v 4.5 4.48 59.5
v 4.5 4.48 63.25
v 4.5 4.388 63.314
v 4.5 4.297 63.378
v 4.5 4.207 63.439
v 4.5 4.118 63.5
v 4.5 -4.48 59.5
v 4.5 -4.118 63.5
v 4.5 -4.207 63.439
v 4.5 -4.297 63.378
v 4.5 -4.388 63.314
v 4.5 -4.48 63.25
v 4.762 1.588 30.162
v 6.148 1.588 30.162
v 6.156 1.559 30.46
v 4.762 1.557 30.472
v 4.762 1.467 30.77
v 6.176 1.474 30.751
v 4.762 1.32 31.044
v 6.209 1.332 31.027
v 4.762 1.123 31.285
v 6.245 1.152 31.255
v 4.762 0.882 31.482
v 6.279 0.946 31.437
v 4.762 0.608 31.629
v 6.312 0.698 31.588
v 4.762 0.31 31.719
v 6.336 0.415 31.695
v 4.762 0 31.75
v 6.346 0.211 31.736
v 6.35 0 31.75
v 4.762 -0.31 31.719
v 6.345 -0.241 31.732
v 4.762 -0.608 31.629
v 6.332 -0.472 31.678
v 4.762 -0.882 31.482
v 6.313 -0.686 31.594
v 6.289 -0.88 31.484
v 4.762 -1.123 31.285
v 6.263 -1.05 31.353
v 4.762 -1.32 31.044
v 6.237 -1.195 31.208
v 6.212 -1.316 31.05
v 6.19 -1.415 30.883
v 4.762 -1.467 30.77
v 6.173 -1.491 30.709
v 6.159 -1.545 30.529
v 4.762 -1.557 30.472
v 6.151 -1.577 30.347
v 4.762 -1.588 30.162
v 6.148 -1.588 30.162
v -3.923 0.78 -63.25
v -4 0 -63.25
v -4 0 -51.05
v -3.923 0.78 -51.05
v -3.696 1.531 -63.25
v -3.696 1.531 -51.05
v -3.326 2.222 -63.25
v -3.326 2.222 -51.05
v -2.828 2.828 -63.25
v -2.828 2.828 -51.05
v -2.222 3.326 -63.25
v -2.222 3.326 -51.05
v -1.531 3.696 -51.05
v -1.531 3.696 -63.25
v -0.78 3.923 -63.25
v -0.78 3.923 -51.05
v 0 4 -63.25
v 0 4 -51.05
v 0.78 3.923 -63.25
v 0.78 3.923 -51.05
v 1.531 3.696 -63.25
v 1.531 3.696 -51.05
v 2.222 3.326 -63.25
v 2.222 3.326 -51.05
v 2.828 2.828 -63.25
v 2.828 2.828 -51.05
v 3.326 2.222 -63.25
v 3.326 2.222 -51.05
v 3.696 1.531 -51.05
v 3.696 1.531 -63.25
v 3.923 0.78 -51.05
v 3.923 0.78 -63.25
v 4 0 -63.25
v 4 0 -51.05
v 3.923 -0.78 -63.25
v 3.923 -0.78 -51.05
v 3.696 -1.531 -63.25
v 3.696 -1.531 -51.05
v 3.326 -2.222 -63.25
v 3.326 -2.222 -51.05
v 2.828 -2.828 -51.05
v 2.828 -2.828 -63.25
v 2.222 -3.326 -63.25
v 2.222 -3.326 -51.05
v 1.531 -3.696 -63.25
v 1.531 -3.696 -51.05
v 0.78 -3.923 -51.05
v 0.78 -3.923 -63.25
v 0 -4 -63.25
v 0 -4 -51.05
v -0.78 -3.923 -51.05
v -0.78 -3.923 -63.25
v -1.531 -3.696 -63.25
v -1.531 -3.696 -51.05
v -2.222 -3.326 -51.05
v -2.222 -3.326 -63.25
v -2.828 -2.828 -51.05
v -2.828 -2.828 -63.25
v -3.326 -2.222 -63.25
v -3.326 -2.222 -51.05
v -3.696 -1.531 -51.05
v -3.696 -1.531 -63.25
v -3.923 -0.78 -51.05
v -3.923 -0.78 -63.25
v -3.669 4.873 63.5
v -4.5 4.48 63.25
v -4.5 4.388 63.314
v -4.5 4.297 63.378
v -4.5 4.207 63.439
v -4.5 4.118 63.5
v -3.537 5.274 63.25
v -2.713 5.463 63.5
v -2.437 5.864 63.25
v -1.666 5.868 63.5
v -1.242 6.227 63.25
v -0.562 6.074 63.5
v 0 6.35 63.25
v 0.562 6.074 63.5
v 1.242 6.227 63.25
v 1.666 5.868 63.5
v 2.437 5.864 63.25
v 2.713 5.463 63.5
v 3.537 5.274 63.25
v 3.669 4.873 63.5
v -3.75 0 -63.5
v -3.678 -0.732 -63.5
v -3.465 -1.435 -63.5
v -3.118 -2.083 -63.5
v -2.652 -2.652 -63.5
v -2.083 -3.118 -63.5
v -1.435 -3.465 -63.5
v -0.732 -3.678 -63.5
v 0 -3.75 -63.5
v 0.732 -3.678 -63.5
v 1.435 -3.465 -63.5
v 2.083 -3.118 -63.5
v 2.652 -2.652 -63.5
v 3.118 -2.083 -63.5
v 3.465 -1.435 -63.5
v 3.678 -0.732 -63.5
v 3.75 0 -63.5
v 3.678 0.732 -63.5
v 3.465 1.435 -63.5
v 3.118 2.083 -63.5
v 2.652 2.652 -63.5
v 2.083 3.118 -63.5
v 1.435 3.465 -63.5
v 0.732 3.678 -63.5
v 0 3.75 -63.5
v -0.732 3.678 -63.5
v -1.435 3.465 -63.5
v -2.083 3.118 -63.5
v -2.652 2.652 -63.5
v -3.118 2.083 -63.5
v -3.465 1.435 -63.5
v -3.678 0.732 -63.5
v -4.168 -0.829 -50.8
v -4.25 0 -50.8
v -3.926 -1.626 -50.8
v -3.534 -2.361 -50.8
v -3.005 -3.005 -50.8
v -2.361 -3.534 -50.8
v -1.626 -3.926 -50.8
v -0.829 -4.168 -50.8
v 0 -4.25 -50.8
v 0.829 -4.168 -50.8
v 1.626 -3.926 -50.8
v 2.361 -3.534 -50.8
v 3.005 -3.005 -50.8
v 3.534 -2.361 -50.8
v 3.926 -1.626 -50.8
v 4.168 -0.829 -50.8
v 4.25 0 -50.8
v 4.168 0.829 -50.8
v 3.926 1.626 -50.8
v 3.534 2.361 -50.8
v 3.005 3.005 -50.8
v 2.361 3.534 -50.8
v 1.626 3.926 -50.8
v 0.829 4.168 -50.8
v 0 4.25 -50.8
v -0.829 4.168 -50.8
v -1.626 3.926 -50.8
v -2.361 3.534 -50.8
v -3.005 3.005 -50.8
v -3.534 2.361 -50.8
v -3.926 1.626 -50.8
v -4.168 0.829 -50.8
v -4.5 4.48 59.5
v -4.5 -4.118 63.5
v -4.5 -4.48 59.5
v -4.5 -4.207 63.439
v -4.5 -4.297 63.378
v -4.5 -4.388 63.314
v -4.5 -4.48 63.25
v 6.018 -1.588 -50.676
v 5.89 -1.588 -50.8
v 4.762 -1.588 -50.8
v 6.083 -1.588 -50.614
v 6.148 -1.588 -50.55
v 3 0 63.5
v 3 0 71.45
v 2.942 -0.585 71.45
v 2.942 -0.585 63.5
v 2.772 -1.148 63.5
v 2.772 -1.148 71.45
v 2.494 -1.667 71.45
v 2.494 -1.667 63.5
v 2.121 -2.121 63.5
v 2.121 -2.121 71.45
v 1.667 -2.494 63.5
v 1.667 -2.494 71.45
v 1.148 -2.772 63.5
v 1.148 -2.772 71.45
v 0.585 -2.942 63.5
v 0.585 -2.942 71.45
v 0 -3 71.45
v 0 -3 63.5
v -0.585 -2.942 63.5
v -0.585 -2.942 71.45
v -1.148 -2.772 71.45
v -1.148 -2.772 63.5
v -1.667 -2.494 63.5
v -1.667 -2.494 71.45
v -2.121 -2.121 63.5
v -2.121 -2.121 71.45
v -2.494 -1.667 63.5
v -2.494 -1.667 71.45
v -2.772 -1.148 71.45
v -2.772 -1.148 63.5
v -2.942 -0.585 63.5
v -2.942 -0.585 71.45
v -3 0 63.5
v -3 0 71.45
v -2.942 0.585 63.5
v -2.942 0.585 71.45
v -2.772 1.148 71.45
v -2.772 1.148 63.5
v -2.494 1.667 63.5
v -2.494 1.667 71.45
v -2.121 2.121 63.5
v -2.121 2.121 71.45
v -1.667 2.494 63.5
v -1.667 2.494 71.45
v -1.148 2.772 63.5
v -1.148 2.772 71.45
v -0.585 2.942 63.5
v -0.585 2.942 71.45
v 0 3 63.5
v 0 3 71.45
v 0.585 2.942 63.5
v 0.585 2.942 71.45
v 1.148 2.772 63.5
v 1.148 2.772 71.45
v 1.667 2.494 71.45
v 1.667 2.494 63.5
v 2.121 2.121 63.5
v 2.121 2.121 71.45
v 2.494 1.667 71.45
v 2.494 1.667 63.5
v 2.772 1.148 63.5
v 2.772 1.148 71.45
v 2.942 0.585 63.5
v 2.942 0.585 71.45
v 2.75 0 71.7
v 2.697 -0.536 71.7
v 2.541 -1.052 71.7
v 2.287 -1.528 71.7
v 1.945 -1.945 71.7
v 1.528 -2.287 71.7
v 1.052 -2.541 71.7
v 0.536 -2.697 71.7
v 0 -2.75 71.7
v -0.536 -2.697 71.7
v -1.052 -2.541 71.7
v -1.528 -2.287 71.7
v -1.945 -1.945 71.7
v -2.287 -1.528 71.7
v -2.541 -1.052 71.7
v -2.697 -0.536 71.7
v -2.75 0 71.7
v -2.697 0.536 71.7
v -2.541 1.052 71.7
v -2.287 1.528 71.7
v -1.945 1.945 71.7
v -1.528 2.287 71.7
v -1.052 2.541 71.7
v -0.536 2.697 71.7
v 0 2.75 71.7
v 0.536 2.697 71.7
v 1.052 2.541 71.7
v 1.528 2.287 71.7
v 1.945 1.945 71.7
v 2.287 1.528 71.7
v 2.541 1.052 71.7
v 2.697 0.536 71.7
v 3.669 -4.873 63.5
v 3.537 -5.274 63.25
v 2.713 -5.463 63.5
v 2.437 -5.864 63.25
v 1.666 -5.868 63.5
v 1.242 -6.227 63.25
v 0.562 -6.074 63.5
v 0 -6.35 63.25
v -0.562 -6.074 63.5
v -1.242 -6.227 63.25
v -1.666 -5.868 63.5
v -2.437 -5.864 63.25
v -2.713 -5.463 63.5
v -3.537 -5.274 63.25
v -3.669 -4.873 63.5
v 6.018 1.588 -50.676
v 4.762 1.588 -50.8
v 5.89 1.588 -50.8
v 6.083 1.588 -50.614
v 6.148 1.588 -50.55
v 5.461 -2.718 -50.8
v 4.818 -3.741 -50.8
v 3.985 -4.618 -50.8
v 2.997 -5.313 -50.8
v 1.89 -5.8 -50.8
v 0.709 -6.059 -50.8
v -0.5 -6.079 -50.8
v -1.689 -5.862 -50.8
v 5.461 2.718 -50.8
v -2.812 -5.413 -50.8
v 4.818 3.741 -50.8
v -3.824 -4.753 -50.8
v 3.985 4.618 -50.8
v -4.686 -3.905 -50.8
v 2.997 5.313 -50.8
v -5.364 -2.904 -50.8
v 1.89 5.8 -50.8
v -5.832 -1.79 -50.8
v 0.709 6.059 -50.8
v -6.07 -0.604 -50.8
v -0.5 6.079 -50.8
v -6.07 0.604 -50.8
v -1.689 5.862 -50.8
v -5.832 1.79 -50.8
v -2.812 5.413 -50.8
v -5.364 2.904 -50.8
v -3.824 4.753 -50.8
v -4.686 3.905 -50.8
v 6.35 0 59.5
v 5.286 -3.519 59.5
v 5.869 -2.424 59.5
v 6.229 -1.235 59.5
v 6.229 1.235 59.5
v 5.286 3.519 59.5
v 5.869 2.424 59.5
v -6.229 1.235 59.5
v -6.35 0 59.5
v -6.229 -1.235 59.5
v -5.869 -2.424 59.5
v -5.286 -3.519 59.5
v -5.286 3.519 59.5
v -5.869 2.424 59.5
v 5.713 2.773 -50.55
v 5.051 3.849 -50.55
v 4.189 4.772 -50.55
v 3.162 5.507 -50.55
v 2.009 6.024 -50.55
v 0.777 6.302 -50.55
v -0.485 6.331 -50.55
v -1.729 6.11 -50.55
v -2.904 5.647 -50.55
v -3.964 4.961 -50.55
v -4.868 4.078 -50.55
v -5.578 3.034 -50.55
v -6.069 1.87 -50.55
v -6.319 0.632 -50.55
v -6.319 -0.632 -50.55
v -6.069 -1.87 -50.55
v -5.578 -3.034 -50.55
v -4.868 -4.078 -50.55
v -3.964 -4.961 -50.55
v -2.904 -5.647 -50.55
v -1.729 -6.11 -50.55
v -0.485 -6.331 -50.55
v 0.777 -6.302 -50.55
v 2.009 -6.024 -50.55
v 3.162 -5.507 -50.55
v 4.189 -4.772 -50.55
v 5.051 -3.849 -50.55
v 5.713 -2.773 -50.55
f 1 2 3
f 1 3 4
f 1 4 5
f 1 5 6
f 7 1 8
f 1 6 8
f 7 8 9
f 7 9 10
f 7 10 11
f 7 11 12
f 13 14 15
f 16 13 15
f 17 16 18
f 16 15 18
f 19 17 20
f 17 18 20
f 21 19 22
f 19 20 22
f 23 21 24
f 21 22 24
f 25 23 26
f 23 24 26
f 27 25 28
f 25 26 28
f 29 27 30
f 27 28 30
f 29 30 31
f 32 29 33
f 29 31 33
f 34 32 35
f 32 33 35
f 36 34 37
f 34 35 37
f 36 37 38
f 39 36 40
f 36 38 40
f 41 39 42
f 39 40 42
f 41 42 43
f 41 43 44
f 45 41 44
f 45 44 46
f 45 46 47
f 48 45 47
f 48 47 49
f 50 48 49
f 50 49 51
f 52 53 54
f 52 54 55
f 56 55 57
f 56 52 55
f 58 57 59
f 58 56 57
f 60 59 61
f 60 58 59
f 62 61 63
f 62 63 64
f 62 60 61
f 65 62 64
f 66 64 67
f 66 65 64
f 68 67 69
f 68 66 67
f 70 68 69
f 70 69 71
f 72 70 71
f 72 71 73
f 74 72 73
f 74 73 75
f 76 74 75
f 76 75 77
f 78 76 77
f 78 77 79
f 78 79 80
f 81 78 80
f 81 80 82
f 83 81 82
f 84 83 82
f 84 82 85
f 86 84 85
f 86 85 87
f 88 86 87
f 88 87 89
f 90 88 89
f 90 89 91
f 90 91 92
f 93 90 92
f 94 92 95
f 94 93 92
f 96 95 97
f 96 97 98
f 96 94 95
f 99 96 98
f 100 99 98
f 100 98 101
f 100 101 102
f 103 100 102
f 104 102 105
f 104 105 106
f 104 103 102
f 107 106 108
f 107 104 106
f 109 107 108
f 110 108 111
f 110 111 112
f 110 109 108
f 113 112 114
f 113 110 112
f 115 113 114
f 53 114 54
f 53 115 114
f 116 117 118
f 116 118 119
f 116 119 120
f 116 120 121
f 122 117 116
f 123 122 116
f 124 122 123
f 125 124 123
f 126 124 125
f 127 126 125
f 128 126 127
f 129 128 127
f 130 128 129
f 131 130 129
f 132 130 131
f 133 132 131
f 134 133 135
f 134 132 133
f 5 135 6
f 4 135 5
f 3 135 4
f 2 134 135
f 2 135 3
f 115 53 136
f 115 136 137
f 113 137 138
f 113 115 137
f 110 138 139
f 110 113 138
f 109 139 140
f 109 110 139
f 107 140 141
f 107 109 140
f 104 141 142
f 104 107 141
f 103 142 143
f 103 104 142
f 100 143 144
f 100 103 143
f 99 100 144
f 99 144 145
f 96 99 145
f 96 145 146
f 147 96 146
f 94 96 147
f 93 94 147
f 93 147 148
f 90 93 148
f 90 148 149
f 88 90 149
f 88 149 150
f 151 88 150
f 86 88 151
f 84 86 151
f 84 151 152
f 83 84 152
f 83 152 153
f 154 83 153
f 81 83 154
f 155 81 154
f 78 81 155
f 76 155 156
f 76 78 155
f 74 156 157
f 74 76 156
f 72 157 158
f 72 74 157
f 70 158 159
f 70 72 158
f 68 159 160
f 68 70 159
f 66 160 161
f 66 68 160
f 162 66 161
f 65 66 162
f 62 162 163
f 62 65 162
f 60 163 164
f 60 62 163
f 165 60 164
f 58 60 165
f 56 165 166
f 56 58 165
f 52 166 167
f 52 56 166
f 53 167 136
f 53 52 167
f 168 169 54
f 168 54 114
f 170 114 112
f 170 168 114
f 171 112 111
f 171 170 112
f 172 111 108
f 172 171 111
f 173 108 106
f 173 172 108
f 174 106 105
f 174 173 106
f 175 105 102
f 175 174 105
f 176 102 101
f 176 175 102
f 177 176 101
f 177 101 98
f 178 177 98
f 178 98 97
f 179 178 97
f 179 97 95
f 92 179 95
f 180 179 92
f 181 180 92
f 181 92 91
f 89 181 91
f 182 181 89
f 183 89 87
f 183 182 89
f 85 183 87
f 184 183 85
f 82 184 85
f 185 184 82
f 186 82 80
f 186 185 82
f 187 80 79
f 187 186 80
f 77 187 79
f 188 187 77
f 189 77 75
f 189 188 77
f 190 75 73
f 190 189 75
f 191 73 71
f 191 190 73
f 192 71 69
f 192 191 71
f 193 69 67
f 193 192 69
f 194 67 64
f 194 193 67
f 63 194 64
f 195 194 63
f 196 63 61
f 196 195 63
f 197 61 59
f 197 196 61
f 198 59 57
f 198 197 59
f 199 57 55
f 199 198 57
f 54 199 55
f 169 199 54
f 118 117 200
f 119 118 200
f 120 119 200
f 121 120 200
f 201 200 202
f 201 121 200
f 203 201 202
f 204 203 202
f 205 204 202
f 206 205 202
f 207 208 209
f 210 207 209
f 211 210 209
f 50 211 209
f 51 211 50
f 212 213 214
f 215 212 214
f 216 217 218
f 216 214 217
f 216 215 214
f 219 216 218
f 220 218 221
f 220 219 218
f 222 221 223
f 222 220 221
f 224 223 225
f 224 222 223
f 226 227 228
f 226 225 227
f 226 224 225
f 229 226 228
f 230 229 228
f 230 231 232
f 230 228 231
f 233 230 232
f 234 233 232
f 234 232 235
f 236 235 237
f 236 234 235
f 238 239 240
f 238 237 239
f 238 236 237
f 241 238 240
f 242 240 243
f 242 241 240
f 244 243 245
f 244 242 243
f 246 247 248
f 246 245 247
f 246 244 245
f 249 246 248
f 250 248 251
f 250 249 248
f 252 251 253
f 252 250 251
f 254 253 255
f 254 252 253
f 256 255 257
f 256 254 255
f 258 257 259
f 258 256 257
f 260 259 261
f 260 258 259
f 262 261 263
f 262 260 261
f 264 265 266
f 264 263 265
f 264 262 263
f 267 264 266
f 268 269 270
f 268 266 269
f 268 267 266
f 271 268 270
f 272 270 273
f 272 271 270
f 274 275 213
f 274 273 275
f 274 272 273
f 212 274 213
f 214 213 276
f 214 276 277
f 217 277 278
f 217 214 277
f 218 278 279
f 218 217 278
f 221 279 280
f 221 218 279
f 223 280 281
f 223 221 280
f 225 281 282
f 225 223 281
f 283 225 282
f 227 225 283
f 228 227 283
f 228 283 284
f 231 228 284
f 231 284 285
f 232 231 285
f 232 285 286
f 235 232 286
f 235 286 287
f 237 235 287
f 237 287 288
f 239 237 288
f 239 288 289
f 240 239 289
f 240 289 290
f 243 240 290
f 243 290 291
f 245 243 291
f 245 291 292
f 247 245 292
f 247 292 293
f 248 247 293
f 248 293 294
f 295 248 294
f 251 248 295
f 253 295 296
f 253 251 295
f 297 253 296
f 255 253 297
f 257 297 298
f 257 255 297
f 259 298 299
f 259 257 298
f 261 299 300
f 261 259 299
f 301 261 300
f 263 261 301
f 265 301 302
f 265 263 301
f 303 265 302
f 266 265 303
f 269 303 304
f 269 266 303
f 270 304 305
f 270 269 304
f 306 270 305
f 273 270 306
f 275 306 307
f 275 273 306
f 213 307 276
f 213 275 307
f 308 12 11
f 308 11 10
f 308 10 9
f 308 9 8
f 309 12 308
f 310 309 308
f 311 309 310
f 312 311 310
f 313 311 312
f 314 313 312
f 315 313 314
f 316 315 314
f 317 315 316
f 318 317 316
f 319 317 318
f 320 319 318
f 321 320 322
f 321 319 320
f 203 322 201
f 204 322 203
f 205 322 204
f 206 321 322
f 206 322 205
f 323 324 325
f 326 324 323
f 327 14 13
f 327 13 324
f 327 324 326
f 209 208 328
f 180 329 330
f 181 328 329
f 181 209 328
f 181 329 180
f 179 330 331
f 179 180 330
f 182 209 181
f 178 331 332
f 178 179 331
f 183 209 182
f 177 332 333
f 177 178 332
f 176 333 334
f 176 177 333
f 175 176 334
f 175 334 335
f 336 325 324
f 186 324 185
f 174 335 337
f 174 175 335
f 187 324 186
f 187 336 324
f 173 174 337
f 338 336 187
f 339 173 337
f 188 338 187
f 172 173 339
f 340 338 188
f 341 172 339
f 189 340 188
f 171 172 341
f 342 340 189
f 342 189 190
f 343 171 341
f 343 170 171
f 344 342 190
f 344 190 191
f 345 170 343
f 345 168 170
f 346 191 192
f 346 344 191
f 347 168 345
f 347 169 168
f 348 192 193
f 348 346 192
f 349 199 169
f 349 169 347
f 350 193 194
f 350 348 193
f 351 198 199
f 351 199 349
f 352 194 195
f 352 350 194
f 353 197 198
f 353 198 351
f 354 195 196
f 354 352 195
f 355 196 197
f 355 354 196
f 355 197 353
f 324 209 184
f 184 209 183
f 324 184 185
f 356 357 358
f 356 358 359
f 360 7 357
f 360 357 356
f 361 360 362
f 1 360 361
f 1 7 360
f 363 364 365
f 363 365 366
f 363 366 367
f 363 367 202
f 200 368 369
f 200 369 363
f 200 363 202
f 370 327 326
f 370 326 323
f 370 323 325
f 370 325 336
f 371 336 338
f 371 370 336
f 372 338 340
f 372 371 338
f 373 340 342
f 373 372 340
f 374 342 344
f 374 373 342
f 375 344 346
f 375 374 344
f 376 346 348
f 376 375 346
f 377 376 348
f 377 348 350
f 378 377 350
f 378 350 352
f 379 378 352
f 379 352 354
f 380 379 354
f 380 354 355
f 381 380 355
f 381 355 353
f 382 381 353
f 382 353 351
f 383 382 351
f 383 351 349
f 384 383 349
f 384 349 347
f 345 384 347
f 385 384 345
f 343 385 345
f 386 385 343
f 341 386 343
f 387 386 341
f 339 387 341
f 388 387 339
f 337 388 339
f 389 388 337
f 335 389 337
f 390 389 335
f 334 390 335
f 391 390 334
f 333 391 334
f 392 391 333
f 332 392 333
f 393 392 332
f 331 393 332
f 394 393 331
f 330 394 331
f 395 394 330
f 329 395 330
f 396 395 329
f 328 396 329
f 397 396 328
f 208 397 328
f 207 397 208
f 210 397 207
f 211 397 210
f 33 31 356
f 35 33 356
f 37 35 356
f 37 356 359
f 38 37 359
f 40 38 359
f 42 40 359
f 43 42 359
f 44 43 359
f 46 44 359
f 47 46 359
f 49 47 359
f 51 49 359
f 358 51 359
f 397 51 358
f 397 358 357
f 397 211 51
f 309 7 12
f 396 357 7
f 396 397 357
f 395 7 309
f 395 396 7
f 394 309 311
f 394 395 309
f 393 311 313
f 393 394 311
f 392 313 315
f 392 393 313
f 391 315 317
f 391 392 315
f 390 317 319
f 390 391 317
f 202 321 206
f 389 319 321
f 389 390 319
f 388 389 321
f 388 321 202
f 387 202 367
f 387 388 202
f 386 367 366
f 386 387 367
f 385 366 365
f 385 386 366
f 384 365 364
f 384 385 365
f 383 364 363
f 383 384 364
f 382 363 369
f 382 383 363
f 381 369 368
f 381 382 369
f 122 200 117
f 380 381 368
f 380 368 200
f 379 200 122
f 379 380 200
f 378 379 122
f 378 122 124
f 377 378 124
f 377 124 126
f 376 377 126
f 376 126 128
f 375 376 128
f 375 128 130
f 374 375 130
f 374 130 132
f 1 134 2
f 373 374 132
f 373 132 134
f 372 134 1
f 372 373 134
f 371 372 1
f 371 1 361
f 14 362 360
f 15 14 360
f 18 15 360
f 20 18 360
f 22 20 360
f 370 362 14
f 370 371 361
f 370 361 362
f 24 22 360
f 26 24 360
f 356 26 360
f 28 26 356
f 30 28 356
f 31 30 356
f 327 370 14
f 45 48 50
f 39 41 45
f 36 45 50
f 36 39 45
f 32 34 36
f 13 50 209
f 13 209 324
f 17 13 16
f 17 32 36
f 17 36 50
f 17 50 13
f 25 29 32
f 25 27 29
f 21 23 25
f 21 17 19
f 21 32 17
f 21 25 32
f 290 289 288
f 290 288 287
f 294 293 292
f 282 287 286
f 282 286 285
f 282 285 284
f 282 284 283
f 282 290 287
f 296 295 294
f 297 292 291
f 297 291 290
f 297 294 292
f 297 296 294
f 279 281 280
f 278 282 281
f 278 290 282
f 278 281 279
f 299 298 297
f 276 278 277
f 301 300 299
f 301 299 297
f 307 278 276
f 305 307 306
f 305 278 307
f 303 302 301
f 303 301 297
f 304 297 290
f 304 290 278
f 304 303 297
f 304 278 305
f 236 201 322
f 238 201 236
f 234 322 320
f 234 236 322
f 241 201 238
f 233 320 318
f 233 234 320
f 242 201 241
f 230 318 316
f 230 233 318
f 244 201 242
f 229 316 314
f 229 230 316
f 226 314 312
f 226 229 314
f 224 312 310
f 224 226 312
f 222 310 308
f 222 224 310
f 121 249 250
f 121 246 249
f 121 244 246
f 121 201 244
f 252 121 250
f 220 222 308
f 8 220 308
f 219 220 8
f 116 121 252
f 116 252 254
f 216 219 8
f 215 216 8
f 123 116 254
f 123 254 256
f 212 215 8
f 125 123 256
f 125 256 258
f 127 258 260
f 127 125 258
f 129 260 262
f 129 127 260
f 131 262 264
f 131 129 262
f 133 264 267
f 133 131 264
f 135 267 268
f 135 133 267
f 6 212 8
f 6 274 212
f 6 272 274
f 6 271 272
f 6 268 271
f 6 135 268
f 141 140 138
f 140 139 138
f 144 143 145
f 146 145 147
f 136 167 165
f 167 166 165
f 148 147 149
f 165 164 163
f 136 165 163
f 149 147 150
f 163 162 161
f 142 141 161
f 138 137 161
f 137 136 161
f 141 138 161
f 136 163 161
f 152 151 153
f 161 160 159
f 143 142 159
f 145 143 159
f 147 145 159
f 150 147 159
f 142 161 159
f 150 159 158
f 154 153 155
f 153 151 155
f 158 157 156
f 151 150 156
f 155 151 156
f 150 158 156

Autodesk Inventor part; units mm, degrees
ref_plane "YZ Plane" through (0, 0, 0) normal (1, 0, 0) x (0, 1, 0)
ref_plane "XZ Plane" through (0, 0, 0) normal (0, 1, 0) x (-1, 0, 0)
sketch "Sketch1" plane through (0, 0, 0) normal (0, 0, 1) x (1, 0, 0)
  circle A0 centre (0, 0) radius 6.35
  dimension "d0" = 12.7
extrude "Extrusion1" add sketch "Sketch1" along normal mid plane 127
sketch "Sketch2" plane through (0, 0, 63.5) normal (0, 0, 1) x (1, 0, 0)
  circle A0 centre (0, 0) radius 6.35 projected
  line L0 (-4.5, 4.4802) -> (-4.5, -4.4802)
  line L1 (4.5, 4.4802) -> (4.5, -4.4802)
  line L2 (0, 0) -> (0, 6.1782) construction
  dimension "d3" = 9
extrude "Extrusion2" cut sketch "Sketch2" against normal blind 4 contours A0 L1 | L0 A0
sketch "Sketch3" plane through (0, 0, 63.5) normal (0, 0, 1) x (1, 0, 0)
  arc A0 (4.5, 4.4802) -> (-4.5, 4.4802) centre (0, 0) ccw projected
  circle A1 centre (0, 0) radius 3
  dimension "d6" = 6
extrude "Extrusion3" add sketch "Sketch3" along normal blind 8.2
chamfer "Chamfer1" distance 0.25 angle 45 4 edges at (-3, 0, 71.7) (0, -6.35, 63.5) (0, 6.35, 63.5) (-6.35, 0, -63.5)
ref_plane "Work Plane1" through (6.35, 0, 0) normal (1, 0, 0) x (0, 1, 0)
sketch "Sketch4" plane through (6.35, 0, 0) normal (1, 0, 0) x (0, 1, 0)
  line L0 (6.1, -63.5) -> (-6.1, -63.5) projected
  line L1 (0, -63.5) -> (0, -7.8695) construction
  line L2 (-1.5875, -63.5) -> (-1.5875, 30.1625)
  line L3 (0, 31.75) -> (0, 31.75)
  line L4 (1.5875, 30.1625) -> (1.5875, -63.5)
  arc A0 (0, 31.75) -> (-1.5875, 30.1625) centre (0, 30.1625) ccw
  arc A1 (1.5875, 30.1625) -> (0, 31.75) centre (0, 30.1625) ccw
  point P0 (1.5875, 31.75)
  dimension "d12" = 95.25
  dimension "d13" = 3.175
  dimension "d14" = 1.5875
extrude "Extrusion4" cut sketch "Sketch4" against normal blind 1.5875
sketch "Sketch5" plane through (0, 0, -63.5) normal (0, 0, -1) x (-1, 0, 0)
  arc A0 (-5.8898, -1.5875) -> (-5.8898, 1.5875) centre (0, 0) ccw projected
  circle A1 centre (0, 0) radius 4
  circle A2 centre (0, 0) radius 6.35
  dimension "d18" = 8
  dimension "d19" = 12.7
extrude "Extrusion5" cut sketch "Sketch5" against normal blind 12.7
chamfer "Chamfer2" distance 0.25 angle 45 3 edges at (4, 0, -63.5) (4, 0, -50.8) (-6.35, 0, -50.8)
properties part number "BB2-OutputShaft" material "Steel, Mild"
